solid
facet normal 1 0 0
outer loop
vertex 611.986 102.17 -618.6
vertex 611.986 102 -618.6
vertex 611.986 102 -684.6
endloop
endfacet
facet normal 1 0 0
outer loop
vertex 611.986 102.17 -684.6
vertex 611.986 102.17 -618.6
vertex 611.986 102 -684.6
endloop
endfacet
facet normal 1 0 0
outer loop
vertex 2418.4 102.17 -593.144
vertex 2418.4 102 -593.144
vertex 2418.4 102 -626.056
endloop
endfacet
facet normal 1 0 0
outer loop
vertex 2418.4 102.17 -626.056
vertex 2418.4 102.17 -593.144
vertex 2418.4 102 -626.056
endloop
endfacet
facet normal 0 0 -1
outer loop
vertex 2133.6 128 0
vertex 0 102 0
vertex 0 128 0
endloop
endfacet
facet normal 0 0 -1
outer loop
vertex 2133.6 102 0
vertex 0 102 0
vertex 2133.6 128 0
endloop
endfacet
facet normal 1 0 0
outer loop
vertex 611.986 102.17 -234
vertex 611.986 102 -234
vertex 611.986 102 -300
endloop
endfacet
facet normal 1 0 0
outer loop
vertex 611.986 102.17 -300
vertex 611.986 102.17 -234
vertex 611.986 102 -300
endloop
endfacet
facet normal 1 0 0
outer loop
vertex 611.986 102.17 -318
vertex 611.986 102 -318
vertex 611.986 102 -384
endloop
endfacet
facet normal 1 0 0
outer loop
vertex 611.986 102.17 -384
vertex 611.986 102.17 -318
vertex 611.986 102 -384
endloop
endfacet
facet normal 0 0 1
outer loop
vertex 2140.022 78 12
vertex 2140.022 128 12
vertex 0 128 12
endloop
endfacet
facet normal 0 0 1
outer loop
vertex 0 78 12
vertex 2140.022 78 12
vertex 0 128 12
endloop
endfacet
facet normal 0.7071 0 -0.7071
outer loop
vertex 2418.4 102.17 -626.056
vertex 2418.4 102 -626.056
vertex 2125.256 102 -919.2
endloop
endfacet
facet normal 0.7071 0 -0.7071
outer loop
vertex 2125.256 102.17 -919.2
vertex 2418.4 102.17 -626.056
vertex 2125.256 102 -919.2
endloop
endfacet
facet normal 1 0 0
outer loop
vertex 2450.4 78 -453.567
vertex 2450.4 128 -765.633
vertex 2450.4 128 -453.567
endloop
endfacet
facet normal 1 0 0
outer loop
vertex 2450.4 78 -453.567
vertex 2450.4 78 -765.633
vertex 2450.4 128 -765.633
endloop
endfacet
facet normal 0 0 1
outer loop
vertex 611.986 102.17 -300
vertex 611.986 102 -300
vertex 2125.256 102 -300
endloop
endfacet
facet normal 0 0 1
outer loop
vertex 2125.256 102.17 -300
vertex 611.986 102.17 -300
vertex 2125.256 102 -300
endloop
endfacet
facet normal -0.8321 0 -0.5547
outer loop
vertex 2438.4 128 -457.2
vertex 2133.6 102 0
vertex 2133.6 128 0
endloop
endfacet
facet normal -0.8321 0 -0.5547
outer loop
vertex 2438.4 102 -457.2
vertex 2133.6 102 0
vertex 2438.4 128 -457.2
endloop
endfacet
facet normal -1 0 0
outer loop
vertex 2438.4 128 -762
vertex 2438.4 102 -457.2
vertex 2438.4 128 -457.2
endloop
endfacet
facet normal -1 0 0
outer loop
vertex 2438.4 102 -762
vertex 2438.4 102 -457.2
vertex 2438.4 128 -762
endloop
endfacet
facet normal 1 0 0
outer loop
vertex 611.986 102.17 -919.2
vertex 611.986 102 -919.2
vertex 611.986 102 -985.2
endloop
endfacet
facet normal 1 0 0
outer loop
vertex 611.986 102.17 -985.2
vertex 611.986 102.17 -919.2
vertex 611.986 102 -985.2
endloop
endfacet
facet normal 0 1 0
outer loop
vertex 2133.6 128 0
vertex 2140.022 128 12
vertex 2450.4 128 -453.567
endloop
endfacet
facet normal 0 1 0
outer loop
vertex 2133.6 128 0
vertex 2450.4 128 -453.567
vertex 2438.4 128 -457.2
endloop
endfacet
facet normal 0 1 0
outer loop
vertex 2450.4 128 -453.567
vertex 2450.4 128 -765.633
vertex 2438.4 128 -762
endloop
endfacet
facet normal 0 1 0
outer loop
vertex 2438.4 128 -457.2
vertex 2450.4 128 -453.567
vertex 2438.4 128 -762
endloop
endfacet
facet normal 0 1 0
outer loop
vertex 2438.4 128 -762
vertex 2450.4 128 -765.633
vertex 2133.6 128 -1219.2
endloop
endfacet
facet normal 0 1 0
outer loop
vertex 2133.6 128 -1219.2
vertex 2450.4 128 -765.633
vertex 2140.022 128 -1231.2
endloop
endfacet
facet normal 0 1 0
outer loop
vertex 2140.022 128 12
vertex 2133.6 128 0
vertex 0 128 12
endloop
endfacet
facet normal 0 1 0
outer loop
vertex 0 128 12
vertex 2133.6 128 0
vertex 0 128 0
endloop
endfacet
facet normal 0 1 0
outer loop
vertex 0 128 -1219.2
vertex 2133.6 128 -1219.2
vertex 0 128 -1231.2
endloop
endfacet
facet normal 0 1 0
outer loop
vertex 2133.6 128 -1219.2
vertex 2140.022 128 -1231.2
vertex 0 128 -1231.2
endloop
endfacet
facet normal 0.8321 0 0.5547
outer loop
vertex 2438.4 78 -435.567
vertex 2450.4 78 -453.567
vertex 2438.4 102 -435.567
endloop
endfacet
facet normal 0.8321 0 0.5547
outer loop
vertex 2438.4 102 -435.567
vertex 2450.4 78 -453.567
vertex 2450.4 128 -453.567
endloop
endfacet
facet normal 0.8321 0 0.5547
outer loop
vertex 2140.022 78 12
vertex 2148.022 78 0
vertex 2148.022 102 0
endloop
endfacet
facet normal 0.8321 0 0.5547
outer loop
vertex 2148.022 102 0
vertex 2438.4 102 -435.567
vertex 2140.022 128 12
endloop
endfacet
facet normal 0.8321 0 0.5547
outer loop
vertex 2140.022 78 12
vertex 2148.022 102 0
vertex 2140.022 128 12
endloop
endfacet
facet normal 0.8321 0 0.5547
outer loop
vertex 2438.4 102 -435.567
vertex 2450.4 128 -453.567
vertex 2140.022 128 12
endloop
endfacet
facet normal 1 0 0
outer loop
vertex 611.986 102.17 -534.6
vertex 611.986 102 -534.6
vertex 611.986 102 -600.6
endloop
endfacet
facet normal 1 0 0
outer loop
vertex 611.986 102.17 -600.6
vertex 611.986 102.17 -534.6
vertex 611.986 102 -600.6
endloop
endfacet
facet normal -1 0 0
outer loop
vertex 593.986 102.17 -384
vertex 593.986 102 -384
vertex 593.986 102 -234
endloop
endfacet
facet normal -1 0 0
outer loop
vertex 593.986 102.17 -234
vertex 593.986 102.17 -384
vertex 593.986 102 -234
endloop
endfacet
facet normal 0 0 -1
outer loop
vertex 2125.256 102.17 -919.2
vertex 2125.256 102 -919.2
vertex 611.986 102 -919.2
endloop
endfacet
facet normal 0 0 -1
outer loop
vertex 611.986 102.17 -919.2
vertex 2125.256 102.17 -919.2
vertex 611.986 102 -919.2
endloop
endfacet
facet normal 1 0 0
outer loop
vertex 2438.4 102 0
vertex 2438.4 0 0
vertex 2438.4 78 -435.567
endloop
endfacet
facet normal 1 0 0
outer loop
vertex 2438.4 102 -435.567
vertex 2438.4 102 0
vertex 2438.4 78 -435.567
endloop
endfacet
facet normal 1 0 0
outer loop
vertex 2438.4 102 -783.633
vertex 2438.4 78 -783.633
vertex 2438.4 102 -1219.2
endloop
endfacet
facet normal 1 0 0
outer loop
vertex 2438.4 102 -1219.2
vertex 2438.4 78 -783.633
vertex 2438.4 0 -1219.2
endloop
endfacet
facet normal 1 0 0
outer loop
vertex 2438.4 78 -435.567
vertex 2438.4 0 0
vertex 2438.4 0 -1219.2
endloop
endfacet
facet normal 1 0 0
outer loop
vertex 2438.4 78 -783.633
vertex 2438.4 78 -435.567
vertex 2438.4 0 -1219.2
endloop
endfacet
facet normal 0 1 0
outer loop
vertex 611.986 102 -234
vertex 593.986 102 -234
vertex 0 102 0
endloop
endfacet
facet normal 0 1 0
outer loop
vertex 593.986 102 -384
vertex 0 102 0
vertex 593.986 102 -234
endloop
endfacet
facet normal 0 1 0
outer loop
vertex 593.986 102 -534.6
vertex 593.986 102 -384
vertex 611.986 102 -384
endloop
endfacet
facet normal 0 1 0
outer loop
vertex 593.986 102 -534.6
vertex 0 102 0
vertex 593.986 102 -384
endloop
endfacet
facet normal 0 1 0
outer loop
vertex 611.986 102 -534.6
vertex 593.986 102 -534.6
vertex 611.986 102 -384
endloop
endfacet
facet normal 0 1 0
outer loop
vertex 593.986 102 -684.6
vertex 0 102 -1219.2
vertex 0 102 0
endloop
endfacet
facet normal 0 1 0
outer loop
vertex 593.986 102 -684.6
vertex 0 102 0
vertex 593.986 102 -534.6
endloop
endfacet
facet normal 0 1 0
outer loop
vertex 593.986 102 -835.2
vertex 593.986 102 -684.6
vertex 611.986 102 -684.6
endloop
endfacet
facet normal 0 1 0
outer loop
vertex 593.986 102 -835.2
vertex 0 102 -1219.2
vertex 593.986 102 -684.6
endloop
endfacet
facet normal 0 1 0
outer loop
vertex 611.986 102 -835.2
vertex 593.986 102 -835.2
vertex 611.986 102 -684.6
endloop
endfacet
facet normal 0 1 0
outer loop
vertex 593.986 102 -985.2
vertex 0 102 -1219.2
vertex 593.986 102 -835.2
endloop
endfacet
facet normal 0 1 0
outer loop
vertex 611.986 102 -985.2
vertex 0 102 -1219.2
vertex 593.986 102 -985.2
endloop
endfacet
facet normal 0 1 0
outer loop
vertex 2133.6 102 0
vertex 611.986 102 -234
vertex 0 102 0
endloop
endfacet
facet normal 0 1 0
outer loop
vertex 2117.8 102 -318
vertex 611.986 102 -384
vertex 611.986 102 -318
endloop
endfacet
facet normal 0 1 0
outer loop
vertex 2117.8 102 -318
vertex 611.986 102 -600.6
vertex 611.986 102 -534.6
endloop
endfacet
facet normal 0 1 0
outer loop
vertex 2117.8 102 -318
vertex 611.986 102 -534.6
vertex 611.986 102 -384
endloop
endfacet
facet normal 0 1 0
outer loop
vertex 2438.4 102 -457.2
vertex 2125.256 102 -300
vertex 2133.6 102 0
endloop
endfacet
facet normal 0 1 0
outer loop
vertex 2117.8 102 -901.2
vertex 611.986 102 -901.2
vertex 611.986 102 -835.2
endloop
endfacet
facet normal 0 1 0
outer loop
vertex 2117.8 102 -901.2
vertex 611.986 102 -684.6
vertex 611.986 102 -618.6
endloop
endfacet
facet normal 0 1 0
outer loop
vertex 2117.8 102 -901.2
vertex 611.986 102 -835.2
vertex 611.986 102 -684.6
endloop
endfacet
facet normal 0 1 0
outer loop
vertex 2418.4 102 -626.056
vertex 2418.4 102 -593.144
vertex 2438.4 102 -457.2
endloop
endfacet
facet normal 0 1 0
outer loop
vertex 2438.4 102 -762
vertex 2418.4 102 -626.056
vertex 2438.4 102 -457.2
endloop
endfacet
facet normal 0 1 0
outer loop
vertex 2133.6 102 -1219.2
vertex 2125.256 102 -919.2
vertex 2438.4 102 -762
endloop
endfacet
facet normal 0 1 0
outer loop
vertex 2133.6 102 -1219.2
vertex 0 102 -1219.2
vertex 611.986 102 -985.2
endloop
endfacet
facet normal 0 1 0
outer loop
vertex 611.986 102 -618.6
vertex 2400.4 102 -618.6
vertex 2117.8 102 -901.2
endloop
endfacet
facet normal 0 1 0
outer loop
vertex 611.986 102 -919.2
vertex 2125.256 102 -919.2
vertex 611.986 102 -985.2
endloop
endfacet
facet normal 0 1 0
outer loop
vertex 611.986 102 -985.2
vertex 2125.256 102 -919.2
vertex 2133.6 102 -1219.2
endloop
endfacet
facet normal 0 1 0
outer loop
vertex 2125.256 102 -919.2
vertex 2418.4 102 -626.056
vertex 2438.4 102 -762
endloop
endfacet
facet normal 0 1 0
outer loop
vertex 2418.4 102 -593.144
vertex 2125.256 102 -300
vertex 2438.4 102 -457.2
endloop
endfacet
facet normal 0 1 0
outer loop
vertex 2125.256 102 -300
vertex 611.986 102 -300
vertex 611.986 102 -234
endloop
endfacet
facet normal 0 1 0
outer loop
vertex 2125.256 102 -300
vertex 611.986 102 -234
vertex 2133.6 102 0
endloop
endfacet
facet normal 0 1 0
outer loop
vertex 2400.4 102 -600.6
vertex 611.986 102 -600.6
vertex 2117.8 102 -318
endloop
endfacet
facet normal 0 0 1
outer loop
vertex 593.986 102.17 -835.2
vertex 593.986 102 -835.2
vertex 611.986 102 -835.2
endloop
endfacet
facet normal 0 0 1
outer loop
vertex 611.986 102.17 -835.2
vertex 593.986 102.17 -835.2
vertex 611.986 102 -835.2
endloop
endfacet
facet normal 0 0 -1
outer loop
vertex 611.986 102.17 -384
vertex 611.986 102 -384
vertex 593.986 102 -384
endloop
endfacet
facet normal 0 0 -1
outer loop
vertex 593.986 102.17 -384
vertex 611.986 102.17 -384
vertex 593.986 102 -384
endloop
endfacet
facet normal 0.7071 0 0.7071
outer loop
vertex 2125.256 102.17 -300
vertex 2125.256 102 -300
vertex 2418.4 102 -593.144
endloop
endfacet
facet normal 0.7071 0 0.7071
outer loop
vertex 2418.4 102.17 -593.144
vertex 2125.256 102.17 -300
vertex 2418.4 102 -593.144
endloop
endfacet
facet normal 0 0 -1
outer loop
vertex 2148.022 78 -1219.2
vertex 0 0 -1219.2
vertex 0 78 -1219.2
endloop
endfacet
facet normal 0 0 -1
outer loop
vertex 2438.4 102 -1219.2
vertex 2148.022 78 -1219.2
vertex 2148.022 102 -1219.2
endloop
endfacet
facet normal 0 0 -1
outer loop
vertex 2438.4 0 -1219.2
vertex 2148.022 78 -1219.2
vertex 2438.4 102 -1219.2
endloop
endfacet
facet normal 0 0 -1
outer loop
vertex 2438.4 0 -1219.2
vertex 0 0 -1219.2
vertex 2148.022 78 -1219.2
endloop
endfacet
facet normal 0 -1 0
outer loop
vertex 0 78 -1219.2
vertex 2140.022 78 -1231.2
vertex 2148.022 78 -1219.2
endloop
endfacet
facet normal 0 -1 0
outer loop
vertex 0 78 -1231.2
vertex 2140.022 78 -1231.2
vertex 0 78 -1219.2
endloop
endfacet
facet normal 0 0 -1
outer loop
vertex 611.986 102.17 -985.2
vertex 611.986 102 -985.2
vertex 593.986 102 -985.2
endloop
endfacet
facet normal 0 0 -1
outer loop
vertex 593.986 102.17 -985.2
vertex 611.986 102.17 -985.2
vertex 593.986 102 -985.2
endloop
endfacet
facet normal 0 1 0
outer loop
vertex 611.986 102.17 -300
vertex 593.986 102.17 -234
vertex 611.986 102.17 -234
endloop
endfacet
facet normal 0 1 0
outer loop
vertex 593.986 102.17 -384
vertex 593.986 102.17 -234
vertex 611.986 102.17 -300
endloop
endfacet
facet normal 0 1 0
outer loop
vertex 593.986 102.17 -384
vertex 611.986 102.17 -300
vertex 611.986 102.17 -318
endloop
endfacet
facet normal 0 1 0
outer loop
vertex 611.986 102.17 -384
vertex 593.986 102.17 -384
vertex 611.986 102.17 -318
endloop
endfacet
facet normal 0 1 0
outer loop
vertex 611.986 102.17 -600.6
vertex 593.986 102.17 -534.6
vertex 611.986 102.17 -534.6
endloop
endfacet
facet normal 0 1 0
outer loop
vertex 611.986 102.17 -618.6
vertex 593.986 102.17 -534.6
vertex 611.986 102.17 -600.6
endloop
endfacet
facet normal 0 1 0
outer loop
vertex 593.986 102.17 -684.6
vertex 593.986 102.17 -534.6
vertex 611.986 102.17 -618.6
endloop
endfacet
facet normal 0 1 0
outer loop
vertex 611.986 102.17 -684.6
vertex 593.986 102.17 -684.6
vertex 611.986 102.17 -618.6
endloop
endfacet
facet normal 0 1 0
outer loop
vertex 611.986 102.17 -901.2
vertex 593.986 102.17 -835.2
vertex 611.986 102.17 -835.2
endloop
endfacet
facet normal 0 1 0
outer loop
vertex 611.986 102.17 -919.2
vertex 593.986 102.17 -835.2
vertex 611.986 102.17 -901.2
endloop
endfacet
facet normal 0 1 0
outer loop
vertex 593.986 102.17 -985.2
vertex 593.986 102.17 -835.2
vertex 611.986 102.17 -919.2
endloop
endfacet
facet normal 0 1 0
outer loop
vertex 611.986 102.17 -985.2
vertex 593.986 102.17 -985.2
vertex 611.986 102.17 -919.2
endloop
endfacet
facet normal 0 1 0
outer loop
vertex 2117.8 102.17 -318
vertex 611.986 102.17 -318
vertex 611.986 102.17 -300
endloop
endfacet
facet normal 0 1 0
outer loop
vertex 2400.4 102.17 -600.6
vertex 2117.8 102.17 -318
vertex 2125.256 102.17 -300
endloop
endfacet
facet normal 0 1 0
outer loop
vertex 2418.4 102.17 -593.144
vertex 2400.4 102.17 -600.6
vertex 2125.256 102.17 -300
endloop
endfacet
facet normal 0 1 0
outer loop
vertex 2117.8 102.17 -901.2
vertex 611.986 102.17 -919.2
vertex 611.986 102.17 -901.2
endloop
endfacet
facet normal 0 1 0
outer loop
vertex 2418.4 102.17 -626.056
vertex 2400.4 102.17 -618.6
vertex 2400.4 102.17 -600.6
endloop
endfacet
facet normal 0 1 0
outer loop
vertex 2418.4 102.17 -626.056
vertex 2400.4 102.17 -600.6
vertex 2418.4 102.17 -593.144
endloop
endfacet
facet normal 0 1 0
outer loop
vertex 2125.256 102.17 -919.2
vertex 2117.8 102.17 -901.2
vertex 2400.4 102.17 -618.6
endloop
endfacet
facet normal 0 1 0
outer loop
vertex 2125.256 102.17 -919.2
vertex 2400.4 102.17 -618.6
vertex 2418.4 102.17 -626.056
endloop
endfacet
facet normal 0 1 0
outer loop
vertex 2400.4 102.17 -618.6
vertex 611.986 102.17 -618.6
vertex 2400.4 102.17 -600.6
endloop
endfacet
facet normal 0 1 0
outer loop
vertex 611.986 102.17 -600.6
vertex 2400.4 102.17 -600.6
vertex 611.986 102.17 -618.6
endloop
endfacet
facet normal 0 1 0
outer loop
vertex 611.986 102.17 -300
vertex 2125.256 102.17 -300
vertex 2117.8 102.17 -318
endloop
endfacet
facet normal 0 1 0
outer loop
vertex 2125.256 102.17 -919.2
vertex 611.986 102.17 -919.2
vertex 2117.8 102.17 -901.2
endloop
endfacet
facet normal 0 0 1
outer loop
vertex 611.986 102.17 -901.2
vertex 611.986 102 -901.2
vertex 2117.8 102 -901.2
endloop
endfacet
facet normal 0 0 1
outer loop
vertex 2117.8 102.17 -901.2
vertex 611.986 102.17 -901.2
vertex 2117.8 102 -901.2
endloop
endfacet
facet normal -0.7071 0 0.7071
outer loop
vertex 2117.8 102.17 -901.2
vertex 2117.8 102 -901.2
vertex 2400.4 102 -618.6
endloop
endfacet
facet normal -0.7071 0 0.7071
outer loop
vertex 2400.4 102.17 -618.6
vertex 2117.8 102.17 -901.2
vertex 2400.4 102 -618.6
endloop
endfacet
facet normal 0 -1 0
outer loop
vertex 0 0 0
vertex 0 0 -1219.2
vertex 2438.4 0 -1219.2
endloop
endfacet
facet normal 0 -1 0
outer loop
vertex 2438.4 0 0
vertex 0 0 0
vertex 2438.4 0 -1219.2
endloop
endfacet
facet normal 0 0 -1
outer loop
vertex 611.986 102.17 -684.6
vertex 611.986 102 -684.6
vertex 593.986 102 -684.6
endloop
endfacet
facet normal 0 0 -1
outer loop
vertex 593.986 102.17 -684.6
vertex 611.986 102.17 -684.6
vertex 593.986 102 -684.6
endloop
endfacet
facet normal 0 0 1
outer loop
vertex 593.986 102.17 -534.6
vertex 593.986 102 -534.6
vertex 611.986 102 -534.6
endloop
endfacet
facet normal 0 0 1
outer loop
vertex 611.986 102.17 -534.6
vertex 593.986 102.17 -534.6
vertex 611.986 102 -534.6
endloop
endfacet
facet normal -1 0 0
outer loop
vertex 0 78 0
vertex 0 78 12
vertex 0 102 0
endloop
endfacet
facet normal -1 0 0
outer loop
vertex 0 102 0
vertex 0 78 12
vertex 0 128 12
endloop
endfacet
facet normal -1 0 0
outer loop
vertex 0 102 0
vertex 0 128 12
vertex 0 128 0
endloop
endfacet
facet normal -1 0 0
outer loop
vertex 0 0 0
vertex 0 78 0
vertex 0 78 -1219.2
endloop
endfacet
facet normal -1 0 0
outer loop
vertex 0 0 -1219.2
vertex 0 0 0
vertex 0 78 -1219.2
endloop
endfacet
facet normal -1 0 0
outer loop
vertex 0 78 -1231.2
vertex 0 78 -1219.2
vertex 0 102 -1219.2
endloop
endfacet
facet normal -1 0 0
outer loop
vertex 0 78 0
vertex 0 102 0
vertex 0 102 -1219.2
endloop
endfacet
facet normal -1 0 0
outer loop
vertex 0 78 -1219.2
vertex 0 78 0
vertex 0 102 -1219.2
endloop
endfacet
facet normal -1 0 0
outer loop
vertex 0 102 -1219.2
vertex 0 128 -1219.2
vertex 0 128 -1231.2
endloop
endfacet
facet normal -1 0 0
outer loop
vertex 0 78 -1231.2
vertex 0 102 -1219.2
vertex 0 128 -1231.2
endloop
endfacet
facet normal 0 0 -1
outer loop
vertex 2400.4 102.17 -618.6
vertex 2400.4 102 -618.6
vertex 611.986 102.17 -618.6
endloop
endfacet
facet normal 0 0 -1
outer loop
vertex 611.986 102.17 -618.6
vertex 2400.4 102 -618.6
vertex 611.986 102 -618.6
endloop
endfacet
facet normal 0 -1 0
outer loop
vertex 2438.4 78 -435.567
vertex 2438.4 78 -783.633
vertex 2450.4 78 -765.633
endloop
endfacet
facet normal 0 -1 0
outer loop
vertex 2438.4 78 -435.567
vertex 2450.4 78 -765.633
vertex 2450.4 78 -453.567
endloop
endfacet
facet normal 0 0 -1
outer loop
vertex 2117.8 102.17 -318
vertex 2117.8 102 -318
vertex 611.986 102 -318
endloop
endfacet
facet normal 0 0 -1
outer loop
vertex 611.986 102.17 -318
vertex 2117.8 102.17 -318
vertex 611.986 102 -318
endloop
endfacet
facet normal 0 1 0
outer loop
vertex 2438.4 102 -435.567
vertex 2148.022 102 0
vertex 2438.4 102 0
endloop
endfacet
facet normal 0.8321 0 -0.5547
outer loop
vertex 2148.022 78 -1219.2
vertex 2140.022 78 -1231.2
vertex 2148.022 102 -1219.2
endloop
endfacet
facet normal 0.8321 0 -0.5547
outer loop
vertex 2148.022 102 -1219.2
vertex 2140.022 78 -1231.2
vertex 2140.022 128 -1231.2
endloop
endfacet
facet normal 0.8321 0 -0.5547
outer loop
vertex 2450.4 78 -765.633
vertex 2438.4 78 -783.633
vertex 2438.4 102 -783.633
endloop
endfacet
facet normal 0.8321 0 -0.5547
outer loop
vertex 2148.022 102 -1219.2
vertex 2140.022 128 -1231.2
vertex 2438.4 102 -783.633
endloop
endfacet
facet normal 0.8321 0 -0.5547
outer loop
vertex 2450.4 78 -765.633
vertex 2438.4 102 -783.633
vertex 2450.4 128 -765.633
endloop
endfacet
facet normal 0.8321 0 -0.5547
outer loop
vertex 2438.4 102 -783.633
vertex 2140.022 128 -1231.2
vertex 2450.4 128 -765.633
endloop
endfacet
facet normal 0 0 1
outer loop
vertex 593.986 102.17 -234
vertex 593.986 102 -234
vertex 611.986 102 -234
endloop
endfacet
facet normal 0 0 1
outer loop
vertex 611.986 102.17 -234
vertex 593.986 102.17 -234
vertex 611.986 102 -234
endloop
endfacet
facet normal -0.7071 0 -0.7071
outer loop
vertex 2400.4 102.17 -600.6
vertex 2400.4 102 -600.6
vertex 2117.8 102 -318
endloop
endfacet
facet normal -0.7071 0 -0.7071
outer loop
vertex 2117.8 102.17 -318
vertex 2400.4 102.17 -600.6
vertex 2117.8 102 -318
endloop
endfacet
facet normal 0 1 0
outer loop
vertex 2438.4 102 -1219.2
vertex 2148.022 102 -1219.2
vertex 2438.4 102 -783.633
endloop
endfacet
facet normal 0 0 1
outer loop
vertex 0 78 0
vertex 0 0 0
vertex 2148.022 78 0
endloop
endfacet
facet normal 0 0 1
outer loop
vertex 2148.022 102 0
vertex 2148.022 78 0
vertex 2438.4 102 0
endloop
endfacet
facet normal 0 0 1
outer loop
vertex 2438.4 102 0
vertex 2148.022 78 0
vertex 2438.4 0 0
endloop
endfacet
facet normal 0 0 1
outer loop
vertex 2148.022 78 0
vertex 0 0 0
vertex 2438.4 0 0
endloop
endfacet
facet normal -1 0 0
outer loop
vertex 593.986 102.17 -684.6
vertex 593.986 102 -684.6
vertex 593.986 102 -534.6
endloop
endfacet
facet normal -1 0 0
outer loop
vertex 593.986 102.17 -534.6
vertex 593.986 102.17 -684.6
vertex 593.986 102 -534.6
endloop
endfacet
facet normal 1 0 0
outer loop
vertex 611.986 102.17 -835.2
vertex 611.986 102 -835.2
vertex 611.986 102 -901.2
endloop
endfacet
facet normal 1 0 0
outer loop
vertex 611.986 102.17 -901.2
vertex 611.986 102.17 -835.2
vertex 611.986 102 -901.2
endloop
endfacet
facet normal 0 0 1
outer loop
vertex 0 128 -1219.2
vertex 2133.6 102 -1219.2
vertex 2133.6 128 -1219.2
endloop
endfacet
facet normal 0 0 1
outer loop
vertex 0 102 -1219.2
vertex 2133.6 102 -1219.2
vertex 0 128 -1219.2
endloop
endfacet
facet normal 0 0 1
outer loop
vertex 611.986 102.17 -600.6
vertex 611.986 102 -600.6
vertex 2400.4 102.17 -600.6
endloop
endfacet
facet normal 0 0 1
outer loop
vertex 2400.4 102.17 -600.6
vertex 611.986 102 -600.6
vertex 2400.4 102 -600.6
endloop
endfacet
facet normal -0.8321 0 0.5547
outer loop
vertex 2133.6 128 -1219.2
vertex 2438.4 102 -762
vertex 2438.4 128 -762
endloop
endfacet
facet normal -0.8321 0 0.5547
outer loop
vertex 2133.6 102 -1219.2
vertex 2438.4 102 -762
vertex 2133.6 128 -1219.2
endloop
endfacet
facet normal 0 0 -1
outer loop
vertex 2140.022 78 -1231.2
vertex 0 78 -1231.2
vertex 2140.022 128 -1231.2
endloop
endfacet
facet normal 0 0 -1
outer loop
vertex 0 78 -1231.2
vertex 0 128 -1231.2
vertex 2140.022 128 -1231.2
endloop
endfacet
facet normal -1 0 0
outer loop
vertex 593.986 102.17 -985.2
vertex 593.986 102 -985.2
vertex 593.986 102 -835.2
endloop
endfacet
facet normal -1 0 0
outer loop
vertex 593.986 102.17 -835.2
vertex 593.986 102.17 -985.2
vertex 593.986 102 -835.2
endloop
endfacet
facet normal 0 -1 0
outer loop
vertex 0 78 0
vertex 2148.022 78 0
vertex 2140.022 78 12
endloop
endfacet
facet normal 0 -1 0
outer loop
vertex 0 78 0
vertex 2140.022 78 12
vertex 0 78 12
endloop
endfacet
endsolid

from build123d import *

# Parameters (mm, degrees)
SKETCH1_W                = 2438.4
SKETCH1_H                = 1219.2
BOSS_EXTRUDE1_DEPTH      = 102
EXTRUDE_THIN1_DEPTH      = 26
EXTRUDE_THIN1_DEPTH_BACK = 24
BOSS_EXTRUDE2_DEPTH      = 0.17


with BuildPart() as part:
    # Sketch1 → Boss-Extrude1 (new body)
    with BuildSketch(Plane(origin=(0, 0, 0), x_dir=(1, 0, 0), z_dir=(0, 1, 0))):
        with Locations((1219.2, 609.6)):
            Rectangle(SKETCH1_W, SKETCH1_H)
    extrude(amount=BOSS_EXTRUDE1_DEPTH)

    # Sketch2 → Extrude-Thin1 (add, two sides)
    with BuildSketch(Plane(origin=(0, 102, 0), x_dir=(1, 0, 0), z_dir=(0, 1, 0))) as extrude_thin1_sk:
        Polygon((0, 0), (2133.6, 0), (2438.4, 457.2), (2438.4, 762), (2133.6, 1219.2), (0, 1219.2), (0, 1231.2), (2140.022205102, 1231.2), (2450.4, 765.633307653), (2450.4, 453.566692347), (2140.022205102, -12), (0, -12), align=None)
    extrude(amount=EXTRUDE_THIN1_DEPTH)
    extrude(extrude_thin1_sk.sketch, amount=-EXTRUDE_THIN1_DEPTH_BACK)

    # Sketch3 → Boss-Extrude2 (add)
    with BuildSketch(Plane(origin=(0, 102, 0), x_dir=(1, 0, 0), z_dir=(0, 1, 0))):
        Polygon((2400.4, 618.6), (611.985938124, 618.6), (611.985938124, 684.6), (593.985938124, 684.6), (593.985938124, 534.6), (611.985938124, 534.6), (611.985938124, 600.6), (2400.4, 600.6), (2117.8, 318), (611.985938124, 318), (611.985938124, 384), (593.985938124, 384), (593.985938124, 234), (611.985938124, 234), (611.985938124, 300), (2125.255844123, 300), (2418.4, 593.144155877), (2418.4, 626.055844123), (2125.255844123, 919.2), (611.985938124, 919.2), (611.985938124, 985.2), (593.985938124, 985.2), (593.985938124, 835.2), (611.985938124, 835.2), (611.985938124, 901.2), (2117.8, 901.2), align=None)
    extrude(amount=BOSS_EXTRUDE2_DEPTH)


solid = part.part
